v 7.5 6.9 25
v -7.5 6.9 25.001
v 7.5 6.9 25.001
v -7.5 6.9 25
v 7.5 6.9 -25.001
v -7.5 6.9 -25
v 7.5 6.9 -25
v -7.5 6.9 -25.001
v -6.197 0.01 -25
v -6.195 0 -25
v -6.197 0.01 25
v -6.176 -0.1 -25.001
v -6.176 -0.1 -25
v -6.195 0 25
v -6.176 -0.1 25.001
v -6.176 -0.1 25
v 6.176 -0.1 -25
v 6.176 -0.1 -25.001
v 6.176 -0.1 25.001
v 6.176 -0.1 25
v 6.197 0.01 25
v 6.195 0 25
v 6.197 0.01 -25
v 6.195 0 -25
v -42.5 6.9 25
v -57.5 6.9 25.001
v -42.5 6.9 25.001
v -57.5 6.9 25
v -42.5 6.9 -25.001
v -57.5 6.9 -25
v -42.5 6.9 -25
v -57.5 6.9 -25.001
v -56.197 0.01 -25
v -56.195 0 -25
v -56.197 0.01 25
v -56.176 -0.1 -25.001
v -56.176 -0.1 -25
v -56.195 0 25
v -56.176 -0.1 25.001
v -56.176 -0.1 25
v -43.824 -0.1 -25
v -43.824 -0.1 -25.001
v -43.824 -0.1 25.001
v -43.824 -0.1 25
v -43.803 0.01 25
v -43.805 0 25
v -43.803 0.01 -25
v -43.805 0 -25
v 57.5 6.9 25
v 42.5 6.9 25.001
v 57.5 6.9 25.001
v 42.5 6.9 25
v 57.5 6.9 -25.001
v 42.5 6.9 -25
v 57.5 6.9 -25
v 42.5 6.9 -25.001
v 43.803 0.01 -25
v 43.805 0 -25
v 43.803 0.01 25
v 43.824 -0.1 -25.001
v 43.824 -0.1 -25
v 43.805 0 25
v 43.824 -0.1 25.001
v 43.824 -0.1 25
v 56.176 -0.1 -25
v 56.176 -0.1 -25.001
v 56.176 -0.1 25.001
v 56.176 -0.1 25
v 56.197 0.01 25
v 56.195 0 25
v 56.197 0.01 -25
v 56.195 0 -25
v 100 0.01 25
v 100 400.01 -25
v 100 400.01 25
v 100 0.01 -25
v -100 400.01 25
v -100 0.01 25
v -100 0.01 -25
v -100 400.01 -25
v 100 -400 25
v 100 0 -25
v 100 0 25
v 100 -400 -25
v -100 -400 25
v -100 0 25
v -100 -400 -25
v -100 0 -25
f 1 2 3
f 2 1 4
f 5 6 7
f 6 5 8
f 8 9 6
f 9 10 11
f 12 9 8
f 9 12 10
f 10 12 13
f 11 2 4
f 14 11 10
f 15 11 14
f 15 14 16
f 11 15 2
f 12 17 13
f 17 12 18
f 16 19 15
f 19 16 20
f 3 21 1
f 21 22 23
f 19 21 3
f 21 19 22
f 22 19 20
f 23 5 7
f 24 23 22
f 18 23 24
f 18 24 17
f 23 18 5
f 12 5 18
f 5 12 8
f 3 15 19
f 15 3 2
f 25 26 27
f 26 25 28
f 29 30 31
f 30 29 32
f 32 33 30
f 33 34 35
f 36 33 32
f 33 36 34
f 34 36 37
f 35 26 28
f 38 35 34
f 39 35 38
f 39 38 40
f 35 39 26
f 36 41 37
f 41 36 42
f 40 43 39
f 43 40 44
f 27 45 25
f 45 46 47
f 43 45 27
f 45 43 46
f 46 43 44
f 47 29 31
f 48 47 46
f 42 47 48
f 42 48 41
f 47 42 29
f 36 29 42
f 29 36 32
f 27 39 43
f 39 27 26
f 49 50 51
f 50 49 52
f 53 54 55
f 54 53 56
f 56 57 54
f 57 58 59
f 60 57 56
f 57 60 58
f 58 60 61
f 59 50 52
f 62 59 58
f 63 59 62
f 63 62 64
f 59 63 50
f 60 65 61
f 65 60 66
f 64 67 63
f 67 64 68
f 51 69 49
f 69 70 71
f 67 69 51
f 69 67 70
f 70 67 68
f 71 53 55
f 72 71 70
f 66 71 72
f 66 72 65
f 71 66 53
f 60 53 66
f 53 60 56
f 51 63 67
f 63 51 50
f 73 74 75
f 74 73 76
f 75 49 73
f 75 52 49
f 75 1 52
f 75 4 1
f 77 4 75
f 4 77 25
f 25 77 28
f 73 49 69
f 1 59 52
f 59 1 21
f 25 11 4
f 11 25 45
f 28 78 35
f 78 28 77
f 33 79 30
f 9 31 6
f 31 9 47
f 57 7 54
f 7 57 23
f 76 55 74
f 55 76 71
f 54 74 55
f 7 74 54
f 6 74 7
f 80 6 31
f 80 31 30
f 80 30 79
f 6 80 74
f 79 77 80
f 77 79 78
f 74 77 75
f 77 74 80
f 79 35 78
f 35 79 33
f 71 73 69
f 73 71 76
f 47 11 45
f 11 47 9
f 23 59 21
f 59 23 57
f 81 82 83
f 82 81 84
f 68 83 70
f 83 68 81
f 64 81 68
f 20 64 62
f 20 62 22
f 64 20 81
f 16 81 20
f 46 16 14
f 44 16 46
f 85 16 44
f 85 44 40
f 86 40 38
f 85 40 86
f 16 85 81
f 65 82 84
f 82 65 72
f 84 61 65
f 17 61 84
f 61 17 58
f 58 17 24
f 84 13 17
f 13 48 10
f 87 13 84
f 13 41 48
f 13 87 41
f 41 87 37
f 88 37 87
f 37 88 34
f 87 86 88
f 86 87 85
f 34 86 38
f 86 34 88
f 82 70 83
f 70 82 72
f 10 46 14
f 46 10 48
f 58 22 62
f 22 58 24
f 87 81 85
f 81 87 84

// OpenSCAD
cutter(0);
#cutter(1);

module cutter(side = 0){
    if (side == 0){
        difference(){
            translate([0,200.01,0])cube([200,400,50], center = true);
            translate([0,-200,0])cube([200,400,50], center = true);
            tab(0);
            tab(-50);
            tab(50);
        }
    } else {
        translate([0,-200,0])cube([200,400,50], center = true);
        tab(0);
        tab(-50);
        tab(50);
    }
}

module tab(distance){
    tab_deep = 7;
    difference(){
        translate([distance,tab_deep-0.1,0])scale([1,1,9])rotate([90,0,0])linear_extrude(height = tab_deep, scale = 14/17) square(15, center = true);
        translate([0,0,-50.001])cube([210,210,50], center = true);
        translate([0,0,50.001])cube([210,210,50], center = true);
    }
}
